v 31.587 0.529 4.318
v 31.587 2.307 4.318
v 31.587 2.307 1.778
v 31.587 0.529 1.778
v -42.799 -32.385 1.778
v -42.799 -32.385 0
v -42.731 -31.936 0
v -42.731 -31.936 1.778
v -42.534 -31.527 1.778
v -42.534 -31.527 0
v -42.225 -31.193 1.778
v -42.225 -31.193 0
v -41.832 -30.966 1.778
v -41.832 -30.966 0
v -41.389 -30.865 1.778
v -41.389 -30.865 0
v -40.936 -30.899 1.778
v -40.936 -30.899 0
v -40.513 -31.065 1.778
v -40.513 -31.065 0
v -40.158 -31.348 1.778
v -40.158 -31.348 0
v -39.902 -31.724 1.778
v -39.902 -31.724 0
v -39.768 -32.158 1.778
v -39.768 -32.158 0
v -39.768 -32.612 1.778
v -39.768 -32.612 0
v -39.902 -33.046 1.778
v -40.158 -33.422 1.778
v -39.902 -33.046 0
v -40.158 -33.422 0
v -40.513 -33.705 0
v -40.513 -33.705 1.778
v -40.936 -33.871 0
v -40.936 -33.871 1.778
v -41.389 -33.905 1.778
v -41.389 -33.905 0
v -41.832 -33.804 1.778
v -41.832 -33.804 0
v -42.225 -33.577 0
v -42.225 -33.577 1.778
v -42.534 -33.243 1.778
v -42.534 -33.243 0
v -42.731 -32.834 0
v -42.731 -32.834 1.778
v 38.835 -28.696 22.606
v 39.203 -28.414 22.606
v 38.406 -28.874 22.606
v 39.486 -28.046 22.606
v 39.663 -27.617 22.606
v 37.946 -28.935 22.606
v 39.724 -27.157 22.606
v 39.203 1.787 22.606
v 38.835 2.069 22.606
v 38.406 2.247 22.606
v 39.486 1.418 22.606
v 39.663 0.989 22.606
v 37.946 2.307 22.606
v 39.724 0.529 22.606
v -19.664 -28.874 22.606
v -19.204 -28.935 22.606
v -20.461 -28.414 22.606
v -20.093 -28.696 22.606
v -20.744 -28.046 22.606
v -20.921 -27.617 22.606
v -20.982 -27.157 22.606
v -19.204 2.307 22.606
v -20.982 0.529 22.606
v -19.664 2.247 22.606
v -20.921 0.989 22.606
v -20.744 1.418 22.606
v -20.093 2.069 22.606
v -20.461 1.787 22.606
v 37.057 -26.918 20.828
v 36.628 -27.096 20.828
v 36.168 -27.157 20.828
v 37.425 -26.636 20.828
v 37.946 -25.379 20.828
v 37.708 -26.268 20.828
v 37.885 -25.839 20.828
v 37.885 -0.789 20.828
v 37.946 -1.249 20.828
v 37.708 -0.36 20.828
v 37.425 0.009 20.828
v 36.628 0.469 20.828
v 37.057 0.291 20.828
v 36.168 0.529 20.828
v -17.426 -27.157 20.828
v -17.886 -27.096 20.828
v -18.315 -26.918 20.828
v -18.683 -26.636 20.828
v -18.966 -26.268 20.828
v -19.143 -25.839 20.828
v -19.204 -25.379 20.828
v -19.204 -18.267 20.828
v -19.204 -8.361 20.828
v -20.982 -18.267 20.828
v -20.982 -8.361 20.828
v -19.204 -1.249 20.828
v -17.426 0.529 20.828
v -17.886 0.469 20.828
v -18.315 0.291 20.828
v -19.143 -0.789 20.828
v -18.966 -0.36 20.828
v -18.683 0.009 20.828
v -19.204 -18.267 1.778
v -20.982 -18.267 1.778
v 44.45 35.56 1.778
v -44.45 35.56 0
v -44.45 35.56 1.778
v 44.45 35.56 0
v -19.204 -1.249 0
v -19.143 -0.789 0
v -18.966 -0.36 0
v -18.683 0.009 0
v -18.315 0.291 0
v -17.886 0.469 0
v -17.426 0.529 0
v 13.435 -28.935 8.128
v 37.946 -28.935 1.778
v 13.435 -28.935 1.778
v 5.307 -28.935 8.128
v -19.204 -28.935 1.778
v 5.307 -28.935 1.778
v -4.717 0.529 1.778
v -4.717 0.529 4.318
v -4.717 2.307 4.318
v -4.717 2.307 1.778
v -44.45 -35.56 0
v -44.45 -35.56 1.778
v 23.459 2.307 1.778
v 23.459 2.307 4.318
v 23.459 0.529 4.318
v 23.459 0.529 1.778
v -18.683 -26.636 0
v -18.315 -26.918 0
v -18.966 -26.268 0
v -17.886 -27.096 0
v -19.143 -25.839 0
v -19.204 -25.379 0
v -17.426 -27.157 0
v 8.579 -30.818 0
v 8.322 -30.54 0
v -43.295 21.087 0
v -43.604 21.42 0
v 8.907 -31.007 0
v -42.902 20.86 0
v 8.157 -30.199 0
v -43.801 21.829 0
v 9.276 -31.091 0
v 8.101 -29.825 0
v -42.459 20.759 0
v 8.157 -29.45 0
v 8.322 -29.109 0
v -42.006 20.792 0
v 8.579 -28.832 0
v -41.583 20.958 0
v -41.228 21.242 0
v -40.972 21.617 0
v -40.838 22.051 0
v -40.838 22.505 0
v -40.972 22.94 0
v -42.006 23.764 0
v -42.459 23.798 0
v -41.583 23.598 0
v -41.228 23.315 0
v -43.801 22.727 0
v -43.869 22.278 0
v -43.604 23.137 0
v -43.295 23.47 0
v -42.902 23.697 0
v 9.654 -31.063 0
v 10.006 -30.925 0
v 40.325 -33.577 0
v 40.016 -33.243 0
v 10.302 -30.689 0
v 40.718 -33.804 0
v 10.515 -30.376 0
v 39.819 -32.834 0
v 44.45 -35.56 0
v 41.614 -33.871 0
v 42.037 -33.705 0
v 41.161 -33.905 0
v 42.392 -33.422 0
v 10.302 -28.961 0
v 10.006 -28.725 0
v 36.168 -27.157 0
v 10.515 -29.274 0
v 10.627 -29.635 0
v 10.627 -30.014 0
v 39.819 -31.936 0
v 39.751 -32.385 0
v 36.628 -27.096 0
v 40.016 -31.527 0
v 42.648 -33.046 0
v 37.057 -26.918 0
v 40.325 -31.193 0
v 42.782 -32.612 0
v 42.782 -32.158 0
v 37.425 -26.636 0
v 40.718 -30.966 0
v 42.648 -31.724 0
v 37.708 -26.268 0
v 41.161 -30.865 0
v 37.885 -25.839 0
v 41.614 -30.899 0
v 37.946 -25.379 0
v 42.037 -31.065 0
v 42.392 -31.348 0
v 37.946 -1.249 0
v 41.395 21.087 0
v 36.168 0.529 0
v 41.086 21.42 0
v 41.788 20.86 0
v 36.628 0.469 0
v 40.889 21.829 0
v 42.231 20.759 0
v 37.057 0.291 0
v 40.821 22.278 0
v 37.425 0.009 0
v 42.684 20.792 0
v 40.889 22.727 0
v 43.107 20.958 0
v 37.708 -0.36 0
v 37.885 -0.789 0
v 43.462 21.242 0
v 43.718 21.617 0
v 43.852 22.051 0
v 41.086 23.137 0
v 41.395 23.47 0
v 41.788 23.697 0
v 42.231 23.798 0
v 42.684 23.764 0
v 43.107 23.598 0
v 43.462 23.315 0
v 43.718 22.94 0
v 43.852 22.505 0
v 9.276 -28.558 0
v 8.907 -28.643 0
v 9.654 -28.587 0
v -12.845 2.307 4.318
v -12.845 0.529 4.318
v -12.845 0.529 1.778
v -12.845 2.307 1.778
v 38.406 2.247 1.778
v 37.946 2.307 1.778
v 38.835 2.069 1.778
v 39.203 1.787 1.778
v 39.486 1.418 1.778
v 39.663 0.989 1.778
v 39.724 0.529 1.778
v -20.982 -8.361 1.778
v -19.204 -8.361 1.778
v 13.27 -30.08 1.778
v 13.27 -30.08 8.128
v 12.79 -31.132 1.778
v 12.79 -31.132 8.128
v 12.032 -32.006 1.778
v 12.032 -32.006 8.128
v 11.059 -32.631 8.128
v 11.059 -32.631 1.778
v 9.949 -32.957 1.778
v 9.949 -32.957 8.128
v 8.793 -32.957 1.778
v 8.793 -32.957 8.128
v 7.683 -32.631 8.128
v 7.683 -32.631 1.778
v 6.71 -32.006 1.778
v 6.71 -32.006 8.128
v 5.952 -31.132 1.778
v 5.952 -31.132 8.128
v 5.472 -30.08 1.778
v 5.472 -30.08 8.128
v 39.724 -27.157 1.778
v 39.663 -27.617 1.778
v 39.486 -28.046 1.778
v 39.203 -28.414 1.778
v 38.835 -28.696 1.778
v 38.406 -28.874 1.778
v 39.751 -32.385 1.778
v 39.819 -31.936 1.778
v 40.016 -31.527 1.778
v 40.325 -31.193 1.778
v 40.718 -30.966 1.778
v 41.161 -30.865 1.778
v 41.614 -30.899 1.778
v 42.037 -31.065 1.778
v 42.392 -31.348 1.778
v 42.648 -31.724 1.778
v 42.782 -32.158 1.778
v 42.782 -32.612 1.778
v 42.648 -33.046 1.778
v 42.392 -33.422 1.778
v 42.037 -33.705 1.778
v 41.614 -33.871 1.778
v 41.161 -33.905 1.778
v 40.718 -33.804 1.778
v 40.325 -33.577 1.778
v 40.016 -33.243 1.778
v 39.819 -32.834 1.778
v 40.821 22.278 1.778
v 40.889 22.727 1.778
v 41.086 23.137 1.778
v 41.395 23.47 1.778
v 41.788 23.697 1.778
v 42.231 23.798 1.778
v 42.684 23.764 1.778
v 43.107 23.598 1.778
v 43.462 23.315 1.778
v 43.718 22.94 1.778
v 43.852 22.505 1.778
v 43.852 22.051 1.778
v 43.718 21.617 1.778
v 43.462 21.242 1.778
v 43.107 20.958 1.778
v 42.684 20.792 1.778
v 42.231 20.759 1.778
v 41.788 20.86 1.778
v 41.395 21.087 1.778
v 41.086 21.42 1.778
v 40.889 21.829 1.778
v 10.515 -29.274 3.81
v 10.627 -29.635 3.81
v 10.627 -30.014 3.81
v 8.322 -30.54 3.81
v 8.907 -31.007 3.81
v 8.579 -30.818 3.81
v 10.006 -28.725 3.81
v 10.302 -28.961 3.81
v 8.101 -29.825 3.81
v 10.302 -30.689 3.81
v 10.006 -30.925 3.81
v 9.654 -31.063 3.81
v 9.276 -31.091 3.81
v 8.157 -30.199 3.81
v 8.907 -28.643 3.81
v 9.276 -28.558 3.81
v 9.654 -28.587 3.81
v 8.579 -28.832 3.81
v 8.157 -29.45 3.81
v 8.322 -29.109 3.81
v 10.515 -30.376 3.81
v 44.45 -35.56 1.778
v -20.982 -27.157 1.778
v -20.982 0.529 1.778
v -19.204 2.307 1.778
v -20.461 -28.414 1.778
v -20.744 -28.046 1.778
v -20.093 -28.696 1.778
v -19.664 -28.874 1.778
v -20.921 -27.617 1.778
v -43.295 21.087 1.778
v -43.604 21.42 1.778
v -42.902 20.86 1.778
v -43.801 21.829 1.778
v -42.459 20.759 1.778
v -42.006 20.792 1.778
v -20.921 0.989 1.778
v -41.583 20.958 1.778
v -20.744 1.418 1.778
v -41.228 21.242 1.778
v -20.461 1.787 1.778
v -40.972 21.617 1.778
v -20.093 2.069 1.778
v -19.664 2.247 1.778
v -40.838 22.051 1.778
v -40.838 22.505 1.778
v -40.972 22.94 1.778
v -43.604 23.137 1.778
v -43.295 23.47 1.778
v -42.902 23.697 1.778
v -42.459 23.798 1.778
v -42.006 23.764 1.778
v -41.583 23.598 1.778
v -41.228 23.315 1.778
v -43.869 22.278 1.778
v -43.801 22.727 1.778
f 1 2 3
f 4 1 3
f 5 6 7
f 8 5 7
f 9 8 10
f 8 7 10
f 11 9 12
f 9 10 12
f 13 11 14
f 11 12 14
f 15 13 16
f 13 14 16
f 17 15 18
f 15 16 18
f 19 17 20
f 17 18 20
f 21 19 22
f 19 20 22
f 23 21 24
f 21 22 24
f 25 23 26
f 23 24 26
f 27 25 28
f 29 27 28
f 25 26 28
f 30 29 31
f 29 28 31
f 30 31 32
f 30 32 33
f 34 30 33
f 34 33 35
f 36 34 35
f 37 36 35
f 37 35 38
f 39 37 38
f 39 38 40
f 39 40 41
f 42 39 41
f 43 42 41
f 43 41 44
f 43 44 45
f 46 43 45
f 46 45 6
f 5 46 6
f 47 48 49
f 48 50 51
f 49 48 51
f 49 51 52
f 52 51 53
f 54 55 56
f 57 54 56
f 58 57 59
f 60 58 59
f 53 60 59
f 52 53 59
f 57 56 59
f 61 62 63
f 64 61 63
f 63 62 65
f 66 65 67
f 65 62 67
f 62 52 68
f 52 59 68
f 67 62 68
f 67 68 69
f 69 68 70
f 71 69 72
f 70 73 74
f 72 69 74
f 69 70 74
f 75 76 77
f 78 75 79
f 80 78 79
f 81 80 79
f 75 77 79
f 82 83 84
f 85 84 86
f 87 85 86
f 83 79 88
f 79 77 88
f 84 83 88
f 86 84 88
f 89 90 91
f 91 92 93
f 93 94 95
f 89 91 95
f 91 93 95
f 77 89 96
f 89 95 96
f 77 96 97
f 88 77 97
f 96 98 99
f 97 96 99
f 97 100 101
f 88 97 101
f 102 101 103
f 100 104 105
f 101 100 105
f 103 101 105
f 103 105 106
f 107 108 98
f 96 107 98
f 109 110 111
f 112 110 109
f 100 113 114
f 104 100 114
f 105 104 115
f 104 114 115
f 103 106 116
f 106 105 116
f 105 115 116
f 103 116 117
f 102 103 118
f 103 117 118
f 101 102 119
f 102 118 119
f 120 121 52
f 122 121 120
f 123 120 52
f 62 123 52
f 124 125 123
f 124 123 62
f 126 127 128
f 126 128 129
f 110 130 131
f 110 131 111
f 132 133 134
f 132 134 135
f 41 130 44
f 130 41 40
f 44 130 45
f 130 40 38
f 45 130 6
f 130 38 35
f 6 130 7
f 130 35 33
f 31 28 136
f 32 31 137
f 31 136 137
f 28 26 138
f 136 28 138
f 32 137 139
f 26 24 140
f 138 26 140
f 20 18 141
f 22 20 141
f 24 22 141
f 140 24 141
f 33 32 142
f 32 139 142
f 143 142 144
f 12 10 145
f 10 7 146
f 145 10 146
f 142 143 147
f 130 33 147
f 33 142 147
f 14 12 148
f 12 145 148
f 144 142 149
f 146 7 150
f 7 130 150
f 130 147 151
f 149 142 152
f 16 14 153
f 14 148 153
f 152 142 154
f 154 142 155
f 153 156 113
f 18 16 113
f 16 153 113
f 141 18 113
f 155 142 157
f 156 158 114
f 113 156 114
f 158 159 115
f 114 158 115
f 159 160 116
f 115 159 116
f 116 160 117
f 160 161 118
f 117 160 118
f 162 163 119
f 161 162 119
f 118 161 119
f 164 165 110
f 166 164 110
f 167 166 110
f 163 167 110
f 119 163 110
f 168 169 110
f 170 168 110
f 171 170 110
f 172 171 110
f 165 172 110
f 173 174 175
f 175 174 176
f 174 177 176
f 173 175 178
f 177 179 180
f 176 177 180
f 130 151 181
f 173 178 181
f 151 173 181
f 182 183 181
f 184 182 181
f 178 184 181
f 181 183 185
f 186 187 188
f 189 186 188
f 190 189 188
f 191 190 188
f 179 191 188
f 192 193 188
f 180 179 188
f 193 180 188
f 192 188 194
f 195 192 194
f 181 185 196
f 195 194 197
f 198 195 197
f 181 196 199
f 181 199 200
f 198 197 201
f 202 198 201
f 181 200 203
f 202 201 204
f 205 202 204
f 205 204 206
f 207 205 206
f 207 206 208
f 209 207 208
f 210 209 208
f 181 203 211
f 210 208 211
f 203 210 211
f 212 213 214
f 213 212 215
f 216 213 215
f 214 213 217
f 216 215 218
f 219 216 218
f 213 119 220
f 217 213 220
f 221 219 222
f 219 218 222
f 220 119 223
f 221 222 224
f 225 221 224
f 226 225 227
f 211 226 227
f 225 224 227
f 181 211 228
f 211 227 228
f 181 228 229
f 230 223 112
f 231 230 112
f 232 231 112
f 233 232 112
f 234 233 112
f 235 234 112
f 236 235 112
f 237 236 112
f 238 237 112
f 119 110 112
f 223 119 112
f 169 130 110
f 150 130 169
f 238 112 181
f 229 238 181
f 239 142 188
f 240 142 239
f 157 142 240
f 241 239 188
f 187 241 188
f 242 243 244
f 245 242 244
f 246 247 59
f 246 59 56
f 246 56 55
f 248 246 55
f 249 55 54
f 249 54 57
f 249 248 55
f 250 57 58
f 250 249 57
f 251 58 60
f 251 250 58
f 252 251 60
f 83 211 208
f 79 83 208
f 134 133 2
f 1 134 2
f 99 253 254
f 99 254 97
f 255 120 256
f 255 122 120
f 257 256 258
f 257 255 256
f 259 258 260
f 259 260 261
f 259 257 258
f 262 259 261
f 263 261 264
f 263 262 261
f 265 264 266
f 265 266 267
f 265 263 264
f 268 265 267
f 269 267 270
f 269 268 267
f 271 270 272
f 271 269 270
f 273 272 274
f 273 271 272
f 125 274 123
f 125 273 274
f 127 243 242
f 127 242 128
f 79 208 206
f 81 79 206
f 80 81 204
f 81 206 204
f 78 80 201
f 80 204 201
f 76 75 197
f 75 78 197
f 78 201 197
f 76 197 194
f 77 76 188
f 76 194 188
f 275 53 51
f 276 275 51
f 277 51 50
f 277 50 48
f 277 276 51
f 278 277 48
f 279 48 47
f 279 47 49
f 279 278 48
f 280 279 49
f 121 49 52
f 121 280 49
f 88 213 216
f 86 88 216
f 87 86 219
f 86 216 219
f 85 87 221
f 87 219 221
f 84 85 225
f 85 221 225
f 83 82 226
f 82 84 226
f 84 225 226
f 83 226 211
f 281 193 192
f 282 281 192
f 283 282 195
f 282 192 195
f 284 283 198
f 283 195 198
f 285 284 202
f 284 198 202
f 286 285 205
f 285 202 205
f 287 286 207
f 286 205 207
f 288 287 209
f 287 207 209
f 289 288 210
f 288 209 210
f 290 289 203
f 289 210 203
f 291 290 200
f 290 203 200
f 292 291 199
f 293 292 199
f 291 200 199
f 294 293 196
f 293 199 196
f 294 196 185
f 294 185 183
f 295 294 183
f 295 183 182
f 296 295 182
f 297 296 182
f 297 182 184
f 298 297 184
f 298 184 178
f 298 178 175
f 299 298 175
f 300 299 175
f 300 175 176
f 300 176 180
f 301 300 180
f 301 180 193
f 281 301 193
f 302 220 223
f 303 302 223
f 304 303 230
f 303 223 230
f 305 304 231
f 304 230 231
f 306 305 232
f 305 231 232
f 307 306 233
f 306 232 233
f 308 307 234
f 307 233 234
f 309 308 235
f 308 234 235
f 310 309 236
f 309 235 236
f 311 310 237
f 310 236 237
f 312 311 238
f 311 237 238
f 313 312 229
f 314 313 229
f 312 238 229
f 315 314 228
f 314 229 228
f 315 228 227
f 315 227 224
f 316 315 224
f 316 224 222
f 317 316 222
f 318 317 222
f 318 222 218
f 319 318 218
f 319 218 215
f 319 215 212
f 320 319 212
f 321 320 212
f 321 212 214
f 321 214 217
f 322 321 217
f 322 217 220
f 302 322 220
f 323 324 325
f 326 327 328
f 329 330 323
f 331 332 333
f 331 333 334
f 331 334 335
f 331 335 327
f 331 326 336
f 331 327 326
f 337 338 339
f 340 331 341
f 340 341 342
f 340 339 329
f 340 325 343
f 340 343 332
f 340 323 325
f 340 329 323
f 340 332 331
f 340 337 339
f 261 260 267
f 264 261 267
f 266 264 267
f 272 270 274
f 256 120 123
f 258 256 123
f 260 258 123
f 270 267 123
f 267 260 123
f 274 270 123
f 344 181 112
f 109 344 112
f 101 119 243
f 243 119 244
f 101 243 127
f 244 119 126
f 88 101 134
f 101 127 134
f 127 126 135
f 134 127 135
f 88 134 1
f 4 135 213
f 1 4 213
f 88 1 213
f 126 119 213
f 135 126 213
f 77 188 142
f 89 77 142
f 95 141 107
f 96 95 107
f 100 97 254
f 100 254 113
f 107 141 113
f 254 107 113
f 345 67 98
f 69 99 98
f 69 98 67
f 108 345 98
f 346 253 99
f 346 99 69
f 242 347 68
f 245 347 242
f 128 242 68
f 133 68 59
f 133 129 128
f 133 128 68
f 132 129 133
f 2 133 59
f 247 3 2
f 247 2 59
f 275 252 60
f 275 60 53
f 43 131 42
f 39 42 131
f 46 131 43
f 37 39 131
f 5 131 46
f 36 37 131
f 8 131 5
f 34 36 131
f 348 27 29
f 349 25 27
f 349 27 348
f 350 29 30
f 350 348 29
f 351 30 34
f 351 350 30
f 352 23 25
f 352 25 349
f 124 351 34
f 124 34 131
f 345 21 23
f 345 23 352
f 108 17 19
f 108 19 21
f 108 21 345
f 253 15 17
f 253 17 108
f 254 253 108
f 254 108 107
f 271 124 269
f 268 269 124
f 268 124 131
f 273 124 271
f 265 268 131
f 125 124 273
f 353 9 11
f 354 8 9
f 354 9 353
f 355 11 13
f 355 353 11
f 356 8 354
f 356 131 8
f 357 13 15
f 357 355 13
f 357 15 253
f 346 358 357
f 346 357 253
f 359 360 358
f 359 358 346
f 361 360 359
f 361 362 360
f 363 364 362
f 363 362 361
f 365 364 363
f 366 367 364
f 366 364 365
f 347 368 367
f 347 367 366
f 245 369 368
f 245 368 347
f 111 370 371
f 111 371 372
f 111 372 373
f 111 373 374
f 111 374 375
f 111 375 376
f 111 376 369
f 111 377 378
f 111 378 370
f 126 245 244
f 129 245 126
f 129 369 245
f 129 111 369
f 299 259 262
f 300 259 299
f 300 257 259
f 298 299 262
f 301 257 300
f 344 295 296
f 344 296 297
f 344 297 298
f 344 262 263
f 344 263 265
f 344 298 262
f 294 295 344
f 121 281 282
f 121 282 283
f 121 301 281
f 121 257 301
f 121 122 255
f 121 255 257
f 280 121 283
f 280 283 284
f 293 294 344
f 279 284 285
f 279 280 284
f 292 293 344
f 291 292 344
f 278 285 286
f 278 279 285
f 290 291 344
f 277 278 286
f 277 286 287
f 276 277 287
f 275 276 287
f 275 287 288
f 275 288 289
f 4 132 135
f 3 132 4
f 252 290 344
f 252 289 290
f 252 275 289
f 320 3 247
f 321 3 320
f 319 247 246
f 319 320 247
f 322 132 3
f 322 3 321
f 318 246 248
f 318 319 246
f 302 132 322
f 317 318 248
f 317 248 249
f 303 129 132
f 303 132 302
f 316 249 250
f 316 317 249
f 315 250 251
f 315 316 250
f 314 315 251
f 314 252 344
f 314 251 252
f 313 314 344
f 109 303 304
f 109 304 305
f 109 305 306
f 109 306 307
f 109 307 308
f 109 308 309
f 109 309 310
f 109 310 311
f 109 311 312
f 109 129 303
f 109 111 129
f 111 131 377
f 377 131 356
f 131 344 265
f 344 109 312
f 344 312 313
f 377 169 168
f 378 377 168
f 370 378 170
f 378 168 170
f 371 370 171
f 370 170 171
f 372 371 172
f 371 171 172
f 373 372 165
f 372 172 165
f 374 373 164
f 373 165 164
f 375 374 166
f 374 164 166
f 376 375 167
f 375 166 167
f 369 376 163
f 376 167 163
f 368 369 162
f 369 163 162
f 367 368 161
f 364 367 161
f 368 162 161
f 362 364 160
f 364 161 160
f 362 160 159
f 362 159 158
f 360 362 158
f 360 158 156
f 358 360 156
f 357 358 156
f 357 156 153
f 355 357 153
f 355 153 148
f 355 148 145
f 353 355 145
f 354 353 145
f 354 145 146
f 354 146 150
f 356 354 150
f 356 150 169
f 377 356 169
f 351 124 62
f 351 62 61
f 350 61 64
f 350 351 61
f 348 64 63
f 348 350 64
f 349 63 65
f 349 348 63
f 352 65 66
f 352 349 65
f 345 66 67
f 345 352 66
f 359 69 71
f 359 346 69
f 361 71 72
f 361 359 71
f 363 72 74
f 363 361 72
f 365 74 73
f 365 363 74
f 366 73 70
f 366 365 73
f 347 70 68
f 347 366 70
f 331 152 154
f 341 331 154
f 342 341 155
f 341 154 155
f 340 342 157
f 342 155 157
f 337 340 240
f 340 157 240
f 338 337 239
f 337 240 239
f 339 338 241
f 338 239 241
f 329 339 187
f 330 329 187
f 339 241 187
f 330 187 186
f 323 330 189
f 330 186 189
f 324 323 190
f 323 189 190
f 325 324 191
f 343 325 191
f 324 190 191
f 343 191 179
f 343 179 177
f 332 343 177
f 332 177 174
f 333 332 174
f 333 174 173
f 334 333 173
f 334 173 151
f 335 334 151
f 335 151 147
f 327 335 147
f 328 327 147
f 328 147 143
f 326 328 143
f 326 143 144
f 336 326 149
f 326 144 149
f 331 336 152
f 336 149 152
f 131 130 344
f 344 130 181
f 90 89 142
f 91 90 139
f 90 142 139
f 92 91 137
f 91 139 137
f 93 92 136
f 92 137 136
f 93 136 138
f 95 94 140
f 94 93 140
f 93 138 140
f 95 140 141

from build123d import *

# Parameters (mm, degrees)
SKETCH1_W           = 88.9
SKETCH1_H           = 71.12
BOSS_EXTRUDE1_DEPTH = 1.778
SKETCH2_R           = 1.524
CUT_EXTRUDE1_DEPTH  = 2.54
BOSS_EXTRUDE2_DEPTH = 19.05
CUT_EXTRUDE2_START  = -1.778
CUT_EXTRUDE2_DEPTH  = 1.778
BOSS_EXTRUDE3_DEPTH = 2.54
BOSS_EXTRUDE4_DEPTH = 3.81
BOSS_EXTRUDE5_DEPTH = 1.778
SKETCH10_W          = 19.05
SKETCH10_H          = 9.906
CUT_EXTRUDE5_DEPTH  = 1.778
SKETCH12_W          = 8.128
SKETCH12_H          = 2.54
CUT_EXTRUDE6_DEPTH  = 8.509
SKETCH14_R          = 1.27
CUT_EXTRUDE7_DEPTH  = 3.81


with BuildPart() as part:
    # Sketch1 → Boss-Extrude1 (new body)
    with BuildSketch(Plane.XY):
        Rectangle(SKETCH1_W, SKETCH1_H)
    extrude(amount=BOSS_EXTRUDE1_DEPTH)

    # Sketch2 → Cut-Extrude1 (cut)
    with BuildSketch(Plane(origin=(0, 0, 0), x_dir=(-1, 0, 0), z_dir=(0, 0, -1))):
        with Locations((-42.344998858, 22.278284854)):
            Circle(SKETCH2_R)
        with Locations((42.344998858, 22.278284854)):
            Circle(SKETCH2_R)
        with Locations((41.275, -32.385)):
            Circle(SKETCH2_R)
        with Locations((-41.275, -32.385)):
            Circle(SKETCH2_R)
    extrude(amount=-CUT_EXTRUDE1_DEPTH, mode=Mode.SUBTRACT)

    # Sketch3 → Boss-Extrude2 (add)
    with BuildSketch(Plane.XY.offset(1.778)):
        with BuildLine():
            Line((-20.982004201, 0.529316706), (-20.982004201, -27.156683294))
            ThreePointArc((-20.982004201, -27.156683294), (-20.461240058, -28.413919151), (-19.204004201, -28.934683294))
            Line((-19.204004201, -28.934683294), (37.945995799, -28.934683294))
            ThreePointArc((37.945995799, -28.934683294), (39.203231656, -28.413919151), (39.723995799, -27.156683294))
            Line((39.723995799, -27.156683294), (39.723995799, 0.529316706))
            ThreePointArc((39.723995799, 0.529316706), (39.203231656, 1.786552563), (37.945995799, 2.307316706))
            Line((37.945995799, 2.307316706), (-19.204004201, 2.307316706))
            ThreePointArc((-19.204004201, 2.307316706), (-20.461240058, 1.786552563), (-20.982004201, 0.529316706))
        make_face()
        with BuildLine():
            Line((-19.204004201, -1.248683294), (-19.204004201, -25.378683294))
            ThreePointArc((-19.204004201, -25.378683294), (-18.683240058, -26.635919151), (-17.426004201, -27.156683294))
            Line((-17.426004201, -27.156683294), (36.167995799, -27.156683294))
            ThreePointArc((36.167995799, -27.156683294), (37.425231656, -26.635919151), (37.945995799, -25.378683294))
            Line((37.945995799, -25.378683294), (37.945995799, -1.248683294))
            ThreePointArc((37.945995799, -1.248683294), (37.425231656, 0.008552563), (36.167995799, 0.529316706))
            Line((36.167995799, 0.529316706), (-17.426004201, 0.529316706))
            ThreePointArc((-17.426004201, 0.529316706), (-18.683240058, 0.008552563), (-19.204004201, -1.248683294))
        make_face(mode=Mode.SUBTRACT)
    extrude(amount=BOSS_EXTRUDE2_DEPTH)

    # Sketch4 → Cut-Extrude2 (cut)
    with BuildSketch(Plane.XY.offset(1.778).offset(CUT_EXTRUDE2_START)):
        with BuildLine():
            Line((-17.426004201, 0.529316706), (36.167995799, 0.529316706))
            ThreePointArc((36.167995799, 0.529316706), (37.425231656, 0.008552563), (37.945995799, -1.248683294))
            Line((37.945995799, -1.248683294), (37.945995799, -25.378683294))
            ThreePointArc((37.945995799, -25.378683294), (37.425231656, -26.635919151), (36.167995799, -27.156683294))
            Line((36.167995799, -27.156683294), (-17.426004201, -27.156683294))
            ThreePointArc((-17.426004201, -27.156683294), (-18.683240058, -26.635919151), (-19.204004201, -25.378683294))
            Line((-19.204004201, -25.378683294), (-19.204004201, -1.248683294))
            ThreePointArc((-19.204004201, -1.248683294), (-18.683240058, 0.008552563), (-17.426004201, 0.529316706))
        make_face()
    extrude(amount=CUT_EXTRUDE2_DEPTH, mode=Mode.SUBTRACT)

    # Sketch5 → Boss-Extrude3 (add)
    with BuildSketch(Plane.XY.offset(1.778)):
        with BuildLine():
            Line((-12.845316988, 2.307316706), (-4.717316988, 2.307316706))
            ThreePointArc((-4.717316988, 2.307316706), (-8.781316988, 6.371316706), (-12.845316988, 2.307316706))
        make_face()
        with BuildLine():
            Line((31.587308585, 2.307316706), (23.459308585, 2.307316706))
            ThreePointArc((23.459308585, 2.307316706), (27.523308585, 6.371316706), (31.587308585, 2.307316706))
        make_face()
        with BuildLine():
            Line((5.306995799, -28.934683294), (13.434995799, -28.934683294))
            ThreePointArc((13.434995799, -28.934683294), (9.370995799, -32.998683294), (5.306995799, -28.934683294))
        make_face()
    extrude(amount=BOSS_EXTRUDE3_DEPTH)

    # Sketch6 → Boss-Extrude4 (add)
    with BuildSketch(Plane.XY.offset(4.318)):
        with BuildLine():
            Line((5.306995799, -28.934683294), (13.434995799, -28.934683294))
            ThreePointArc((13.434995799, -28.934683294), (9.370995799, -32.998683294), (5.306995799, -28.934683294))
        make_face()
    extrude(amount=BOSS_EXTRUDE4_DEPTH)

    # Sketch7 → Boss-Extrude5 (add)
    with BuildSketch(Plane.XY.offset(20.828)):
        with BuildLine():
            Line((-19.204004201, 2.307316706), (37.945995799, 2.307316706))
            ThreePointArc((37.945995799, 2.307316706), (39.203231656, 1.786552563), (39.723995799, 0.529316706))
            Line((39.723995799, 0.529316706), (39.723995799, -27.156683294))
            ThreePointArc((39.723995799, -27.156683294), (39.203231656, -28.413919151), (37.945995799, -28.934683294))
            Line((37.945995799, -28.934683294), (-19.204004201, -28.934683294))
            ThreePointArc((-19.204004201, -28.934683294), (-20.461240058, -28.413919151), (-20.982004201, -27.156683294))
            Line((-20.982004201, -27.156683294), (-20.982004201, 0.529316706))
            ThreePointArc((-20.982004201, 0.529316706), (-20.461240058, 1.786552563), (-19.204004201, 2.307316706))
        make_face()
    extrude(amount=BOSS_EXTRUDE5_DEPTH)

    # Sketch10 → Cut-Extrude5 (cut)
    with BuildSketch(Plane.ZY.offset(20.982004201)):
        with Locations((11.303, -13.313683294)):
            Rectangle(SKETCH10_W, SKETCH10_H)
    extrude(amount=-CUT_EXTRUDE5_DEPTH, mode=Mode.SUBTRACT)

    # Sketch12 → Cut-Extrude6 (cut, symmetric)
    with BuildSketch(Plane(origin=(0, 2.307316706, 0), x_dir=(1, 0, 0), z_dir=(0, 1, 0))):
        with Locations((-8.781316988, -3.048)):
            Rectangle(SKETCH12_W, SKETCH12_H)
        with Locations((27.523308585, -3.048)):
            Rectangle(SKETCH12_W, SKETCH12_H)
    extrude(amount=CUT_EXTRUDE6_DEPTH, both=True, mode=Mode.SUBTRACT)

    # Sketch14 → Cut-Extrude7 (cut)
    with BuildSketch(Plane(origin=(0, 0, 0), x_dir=(-1, 0, 0), z_dir=(0, 0, -1))):
        with Locations((-9.370995799, -29.824748275)):
            Circle(SKETCH14_R)
    extrude(amount=-CUT_EXTRUDE7_DEPTH, mode=Mode.SUBTRACT)


solid = part.part
